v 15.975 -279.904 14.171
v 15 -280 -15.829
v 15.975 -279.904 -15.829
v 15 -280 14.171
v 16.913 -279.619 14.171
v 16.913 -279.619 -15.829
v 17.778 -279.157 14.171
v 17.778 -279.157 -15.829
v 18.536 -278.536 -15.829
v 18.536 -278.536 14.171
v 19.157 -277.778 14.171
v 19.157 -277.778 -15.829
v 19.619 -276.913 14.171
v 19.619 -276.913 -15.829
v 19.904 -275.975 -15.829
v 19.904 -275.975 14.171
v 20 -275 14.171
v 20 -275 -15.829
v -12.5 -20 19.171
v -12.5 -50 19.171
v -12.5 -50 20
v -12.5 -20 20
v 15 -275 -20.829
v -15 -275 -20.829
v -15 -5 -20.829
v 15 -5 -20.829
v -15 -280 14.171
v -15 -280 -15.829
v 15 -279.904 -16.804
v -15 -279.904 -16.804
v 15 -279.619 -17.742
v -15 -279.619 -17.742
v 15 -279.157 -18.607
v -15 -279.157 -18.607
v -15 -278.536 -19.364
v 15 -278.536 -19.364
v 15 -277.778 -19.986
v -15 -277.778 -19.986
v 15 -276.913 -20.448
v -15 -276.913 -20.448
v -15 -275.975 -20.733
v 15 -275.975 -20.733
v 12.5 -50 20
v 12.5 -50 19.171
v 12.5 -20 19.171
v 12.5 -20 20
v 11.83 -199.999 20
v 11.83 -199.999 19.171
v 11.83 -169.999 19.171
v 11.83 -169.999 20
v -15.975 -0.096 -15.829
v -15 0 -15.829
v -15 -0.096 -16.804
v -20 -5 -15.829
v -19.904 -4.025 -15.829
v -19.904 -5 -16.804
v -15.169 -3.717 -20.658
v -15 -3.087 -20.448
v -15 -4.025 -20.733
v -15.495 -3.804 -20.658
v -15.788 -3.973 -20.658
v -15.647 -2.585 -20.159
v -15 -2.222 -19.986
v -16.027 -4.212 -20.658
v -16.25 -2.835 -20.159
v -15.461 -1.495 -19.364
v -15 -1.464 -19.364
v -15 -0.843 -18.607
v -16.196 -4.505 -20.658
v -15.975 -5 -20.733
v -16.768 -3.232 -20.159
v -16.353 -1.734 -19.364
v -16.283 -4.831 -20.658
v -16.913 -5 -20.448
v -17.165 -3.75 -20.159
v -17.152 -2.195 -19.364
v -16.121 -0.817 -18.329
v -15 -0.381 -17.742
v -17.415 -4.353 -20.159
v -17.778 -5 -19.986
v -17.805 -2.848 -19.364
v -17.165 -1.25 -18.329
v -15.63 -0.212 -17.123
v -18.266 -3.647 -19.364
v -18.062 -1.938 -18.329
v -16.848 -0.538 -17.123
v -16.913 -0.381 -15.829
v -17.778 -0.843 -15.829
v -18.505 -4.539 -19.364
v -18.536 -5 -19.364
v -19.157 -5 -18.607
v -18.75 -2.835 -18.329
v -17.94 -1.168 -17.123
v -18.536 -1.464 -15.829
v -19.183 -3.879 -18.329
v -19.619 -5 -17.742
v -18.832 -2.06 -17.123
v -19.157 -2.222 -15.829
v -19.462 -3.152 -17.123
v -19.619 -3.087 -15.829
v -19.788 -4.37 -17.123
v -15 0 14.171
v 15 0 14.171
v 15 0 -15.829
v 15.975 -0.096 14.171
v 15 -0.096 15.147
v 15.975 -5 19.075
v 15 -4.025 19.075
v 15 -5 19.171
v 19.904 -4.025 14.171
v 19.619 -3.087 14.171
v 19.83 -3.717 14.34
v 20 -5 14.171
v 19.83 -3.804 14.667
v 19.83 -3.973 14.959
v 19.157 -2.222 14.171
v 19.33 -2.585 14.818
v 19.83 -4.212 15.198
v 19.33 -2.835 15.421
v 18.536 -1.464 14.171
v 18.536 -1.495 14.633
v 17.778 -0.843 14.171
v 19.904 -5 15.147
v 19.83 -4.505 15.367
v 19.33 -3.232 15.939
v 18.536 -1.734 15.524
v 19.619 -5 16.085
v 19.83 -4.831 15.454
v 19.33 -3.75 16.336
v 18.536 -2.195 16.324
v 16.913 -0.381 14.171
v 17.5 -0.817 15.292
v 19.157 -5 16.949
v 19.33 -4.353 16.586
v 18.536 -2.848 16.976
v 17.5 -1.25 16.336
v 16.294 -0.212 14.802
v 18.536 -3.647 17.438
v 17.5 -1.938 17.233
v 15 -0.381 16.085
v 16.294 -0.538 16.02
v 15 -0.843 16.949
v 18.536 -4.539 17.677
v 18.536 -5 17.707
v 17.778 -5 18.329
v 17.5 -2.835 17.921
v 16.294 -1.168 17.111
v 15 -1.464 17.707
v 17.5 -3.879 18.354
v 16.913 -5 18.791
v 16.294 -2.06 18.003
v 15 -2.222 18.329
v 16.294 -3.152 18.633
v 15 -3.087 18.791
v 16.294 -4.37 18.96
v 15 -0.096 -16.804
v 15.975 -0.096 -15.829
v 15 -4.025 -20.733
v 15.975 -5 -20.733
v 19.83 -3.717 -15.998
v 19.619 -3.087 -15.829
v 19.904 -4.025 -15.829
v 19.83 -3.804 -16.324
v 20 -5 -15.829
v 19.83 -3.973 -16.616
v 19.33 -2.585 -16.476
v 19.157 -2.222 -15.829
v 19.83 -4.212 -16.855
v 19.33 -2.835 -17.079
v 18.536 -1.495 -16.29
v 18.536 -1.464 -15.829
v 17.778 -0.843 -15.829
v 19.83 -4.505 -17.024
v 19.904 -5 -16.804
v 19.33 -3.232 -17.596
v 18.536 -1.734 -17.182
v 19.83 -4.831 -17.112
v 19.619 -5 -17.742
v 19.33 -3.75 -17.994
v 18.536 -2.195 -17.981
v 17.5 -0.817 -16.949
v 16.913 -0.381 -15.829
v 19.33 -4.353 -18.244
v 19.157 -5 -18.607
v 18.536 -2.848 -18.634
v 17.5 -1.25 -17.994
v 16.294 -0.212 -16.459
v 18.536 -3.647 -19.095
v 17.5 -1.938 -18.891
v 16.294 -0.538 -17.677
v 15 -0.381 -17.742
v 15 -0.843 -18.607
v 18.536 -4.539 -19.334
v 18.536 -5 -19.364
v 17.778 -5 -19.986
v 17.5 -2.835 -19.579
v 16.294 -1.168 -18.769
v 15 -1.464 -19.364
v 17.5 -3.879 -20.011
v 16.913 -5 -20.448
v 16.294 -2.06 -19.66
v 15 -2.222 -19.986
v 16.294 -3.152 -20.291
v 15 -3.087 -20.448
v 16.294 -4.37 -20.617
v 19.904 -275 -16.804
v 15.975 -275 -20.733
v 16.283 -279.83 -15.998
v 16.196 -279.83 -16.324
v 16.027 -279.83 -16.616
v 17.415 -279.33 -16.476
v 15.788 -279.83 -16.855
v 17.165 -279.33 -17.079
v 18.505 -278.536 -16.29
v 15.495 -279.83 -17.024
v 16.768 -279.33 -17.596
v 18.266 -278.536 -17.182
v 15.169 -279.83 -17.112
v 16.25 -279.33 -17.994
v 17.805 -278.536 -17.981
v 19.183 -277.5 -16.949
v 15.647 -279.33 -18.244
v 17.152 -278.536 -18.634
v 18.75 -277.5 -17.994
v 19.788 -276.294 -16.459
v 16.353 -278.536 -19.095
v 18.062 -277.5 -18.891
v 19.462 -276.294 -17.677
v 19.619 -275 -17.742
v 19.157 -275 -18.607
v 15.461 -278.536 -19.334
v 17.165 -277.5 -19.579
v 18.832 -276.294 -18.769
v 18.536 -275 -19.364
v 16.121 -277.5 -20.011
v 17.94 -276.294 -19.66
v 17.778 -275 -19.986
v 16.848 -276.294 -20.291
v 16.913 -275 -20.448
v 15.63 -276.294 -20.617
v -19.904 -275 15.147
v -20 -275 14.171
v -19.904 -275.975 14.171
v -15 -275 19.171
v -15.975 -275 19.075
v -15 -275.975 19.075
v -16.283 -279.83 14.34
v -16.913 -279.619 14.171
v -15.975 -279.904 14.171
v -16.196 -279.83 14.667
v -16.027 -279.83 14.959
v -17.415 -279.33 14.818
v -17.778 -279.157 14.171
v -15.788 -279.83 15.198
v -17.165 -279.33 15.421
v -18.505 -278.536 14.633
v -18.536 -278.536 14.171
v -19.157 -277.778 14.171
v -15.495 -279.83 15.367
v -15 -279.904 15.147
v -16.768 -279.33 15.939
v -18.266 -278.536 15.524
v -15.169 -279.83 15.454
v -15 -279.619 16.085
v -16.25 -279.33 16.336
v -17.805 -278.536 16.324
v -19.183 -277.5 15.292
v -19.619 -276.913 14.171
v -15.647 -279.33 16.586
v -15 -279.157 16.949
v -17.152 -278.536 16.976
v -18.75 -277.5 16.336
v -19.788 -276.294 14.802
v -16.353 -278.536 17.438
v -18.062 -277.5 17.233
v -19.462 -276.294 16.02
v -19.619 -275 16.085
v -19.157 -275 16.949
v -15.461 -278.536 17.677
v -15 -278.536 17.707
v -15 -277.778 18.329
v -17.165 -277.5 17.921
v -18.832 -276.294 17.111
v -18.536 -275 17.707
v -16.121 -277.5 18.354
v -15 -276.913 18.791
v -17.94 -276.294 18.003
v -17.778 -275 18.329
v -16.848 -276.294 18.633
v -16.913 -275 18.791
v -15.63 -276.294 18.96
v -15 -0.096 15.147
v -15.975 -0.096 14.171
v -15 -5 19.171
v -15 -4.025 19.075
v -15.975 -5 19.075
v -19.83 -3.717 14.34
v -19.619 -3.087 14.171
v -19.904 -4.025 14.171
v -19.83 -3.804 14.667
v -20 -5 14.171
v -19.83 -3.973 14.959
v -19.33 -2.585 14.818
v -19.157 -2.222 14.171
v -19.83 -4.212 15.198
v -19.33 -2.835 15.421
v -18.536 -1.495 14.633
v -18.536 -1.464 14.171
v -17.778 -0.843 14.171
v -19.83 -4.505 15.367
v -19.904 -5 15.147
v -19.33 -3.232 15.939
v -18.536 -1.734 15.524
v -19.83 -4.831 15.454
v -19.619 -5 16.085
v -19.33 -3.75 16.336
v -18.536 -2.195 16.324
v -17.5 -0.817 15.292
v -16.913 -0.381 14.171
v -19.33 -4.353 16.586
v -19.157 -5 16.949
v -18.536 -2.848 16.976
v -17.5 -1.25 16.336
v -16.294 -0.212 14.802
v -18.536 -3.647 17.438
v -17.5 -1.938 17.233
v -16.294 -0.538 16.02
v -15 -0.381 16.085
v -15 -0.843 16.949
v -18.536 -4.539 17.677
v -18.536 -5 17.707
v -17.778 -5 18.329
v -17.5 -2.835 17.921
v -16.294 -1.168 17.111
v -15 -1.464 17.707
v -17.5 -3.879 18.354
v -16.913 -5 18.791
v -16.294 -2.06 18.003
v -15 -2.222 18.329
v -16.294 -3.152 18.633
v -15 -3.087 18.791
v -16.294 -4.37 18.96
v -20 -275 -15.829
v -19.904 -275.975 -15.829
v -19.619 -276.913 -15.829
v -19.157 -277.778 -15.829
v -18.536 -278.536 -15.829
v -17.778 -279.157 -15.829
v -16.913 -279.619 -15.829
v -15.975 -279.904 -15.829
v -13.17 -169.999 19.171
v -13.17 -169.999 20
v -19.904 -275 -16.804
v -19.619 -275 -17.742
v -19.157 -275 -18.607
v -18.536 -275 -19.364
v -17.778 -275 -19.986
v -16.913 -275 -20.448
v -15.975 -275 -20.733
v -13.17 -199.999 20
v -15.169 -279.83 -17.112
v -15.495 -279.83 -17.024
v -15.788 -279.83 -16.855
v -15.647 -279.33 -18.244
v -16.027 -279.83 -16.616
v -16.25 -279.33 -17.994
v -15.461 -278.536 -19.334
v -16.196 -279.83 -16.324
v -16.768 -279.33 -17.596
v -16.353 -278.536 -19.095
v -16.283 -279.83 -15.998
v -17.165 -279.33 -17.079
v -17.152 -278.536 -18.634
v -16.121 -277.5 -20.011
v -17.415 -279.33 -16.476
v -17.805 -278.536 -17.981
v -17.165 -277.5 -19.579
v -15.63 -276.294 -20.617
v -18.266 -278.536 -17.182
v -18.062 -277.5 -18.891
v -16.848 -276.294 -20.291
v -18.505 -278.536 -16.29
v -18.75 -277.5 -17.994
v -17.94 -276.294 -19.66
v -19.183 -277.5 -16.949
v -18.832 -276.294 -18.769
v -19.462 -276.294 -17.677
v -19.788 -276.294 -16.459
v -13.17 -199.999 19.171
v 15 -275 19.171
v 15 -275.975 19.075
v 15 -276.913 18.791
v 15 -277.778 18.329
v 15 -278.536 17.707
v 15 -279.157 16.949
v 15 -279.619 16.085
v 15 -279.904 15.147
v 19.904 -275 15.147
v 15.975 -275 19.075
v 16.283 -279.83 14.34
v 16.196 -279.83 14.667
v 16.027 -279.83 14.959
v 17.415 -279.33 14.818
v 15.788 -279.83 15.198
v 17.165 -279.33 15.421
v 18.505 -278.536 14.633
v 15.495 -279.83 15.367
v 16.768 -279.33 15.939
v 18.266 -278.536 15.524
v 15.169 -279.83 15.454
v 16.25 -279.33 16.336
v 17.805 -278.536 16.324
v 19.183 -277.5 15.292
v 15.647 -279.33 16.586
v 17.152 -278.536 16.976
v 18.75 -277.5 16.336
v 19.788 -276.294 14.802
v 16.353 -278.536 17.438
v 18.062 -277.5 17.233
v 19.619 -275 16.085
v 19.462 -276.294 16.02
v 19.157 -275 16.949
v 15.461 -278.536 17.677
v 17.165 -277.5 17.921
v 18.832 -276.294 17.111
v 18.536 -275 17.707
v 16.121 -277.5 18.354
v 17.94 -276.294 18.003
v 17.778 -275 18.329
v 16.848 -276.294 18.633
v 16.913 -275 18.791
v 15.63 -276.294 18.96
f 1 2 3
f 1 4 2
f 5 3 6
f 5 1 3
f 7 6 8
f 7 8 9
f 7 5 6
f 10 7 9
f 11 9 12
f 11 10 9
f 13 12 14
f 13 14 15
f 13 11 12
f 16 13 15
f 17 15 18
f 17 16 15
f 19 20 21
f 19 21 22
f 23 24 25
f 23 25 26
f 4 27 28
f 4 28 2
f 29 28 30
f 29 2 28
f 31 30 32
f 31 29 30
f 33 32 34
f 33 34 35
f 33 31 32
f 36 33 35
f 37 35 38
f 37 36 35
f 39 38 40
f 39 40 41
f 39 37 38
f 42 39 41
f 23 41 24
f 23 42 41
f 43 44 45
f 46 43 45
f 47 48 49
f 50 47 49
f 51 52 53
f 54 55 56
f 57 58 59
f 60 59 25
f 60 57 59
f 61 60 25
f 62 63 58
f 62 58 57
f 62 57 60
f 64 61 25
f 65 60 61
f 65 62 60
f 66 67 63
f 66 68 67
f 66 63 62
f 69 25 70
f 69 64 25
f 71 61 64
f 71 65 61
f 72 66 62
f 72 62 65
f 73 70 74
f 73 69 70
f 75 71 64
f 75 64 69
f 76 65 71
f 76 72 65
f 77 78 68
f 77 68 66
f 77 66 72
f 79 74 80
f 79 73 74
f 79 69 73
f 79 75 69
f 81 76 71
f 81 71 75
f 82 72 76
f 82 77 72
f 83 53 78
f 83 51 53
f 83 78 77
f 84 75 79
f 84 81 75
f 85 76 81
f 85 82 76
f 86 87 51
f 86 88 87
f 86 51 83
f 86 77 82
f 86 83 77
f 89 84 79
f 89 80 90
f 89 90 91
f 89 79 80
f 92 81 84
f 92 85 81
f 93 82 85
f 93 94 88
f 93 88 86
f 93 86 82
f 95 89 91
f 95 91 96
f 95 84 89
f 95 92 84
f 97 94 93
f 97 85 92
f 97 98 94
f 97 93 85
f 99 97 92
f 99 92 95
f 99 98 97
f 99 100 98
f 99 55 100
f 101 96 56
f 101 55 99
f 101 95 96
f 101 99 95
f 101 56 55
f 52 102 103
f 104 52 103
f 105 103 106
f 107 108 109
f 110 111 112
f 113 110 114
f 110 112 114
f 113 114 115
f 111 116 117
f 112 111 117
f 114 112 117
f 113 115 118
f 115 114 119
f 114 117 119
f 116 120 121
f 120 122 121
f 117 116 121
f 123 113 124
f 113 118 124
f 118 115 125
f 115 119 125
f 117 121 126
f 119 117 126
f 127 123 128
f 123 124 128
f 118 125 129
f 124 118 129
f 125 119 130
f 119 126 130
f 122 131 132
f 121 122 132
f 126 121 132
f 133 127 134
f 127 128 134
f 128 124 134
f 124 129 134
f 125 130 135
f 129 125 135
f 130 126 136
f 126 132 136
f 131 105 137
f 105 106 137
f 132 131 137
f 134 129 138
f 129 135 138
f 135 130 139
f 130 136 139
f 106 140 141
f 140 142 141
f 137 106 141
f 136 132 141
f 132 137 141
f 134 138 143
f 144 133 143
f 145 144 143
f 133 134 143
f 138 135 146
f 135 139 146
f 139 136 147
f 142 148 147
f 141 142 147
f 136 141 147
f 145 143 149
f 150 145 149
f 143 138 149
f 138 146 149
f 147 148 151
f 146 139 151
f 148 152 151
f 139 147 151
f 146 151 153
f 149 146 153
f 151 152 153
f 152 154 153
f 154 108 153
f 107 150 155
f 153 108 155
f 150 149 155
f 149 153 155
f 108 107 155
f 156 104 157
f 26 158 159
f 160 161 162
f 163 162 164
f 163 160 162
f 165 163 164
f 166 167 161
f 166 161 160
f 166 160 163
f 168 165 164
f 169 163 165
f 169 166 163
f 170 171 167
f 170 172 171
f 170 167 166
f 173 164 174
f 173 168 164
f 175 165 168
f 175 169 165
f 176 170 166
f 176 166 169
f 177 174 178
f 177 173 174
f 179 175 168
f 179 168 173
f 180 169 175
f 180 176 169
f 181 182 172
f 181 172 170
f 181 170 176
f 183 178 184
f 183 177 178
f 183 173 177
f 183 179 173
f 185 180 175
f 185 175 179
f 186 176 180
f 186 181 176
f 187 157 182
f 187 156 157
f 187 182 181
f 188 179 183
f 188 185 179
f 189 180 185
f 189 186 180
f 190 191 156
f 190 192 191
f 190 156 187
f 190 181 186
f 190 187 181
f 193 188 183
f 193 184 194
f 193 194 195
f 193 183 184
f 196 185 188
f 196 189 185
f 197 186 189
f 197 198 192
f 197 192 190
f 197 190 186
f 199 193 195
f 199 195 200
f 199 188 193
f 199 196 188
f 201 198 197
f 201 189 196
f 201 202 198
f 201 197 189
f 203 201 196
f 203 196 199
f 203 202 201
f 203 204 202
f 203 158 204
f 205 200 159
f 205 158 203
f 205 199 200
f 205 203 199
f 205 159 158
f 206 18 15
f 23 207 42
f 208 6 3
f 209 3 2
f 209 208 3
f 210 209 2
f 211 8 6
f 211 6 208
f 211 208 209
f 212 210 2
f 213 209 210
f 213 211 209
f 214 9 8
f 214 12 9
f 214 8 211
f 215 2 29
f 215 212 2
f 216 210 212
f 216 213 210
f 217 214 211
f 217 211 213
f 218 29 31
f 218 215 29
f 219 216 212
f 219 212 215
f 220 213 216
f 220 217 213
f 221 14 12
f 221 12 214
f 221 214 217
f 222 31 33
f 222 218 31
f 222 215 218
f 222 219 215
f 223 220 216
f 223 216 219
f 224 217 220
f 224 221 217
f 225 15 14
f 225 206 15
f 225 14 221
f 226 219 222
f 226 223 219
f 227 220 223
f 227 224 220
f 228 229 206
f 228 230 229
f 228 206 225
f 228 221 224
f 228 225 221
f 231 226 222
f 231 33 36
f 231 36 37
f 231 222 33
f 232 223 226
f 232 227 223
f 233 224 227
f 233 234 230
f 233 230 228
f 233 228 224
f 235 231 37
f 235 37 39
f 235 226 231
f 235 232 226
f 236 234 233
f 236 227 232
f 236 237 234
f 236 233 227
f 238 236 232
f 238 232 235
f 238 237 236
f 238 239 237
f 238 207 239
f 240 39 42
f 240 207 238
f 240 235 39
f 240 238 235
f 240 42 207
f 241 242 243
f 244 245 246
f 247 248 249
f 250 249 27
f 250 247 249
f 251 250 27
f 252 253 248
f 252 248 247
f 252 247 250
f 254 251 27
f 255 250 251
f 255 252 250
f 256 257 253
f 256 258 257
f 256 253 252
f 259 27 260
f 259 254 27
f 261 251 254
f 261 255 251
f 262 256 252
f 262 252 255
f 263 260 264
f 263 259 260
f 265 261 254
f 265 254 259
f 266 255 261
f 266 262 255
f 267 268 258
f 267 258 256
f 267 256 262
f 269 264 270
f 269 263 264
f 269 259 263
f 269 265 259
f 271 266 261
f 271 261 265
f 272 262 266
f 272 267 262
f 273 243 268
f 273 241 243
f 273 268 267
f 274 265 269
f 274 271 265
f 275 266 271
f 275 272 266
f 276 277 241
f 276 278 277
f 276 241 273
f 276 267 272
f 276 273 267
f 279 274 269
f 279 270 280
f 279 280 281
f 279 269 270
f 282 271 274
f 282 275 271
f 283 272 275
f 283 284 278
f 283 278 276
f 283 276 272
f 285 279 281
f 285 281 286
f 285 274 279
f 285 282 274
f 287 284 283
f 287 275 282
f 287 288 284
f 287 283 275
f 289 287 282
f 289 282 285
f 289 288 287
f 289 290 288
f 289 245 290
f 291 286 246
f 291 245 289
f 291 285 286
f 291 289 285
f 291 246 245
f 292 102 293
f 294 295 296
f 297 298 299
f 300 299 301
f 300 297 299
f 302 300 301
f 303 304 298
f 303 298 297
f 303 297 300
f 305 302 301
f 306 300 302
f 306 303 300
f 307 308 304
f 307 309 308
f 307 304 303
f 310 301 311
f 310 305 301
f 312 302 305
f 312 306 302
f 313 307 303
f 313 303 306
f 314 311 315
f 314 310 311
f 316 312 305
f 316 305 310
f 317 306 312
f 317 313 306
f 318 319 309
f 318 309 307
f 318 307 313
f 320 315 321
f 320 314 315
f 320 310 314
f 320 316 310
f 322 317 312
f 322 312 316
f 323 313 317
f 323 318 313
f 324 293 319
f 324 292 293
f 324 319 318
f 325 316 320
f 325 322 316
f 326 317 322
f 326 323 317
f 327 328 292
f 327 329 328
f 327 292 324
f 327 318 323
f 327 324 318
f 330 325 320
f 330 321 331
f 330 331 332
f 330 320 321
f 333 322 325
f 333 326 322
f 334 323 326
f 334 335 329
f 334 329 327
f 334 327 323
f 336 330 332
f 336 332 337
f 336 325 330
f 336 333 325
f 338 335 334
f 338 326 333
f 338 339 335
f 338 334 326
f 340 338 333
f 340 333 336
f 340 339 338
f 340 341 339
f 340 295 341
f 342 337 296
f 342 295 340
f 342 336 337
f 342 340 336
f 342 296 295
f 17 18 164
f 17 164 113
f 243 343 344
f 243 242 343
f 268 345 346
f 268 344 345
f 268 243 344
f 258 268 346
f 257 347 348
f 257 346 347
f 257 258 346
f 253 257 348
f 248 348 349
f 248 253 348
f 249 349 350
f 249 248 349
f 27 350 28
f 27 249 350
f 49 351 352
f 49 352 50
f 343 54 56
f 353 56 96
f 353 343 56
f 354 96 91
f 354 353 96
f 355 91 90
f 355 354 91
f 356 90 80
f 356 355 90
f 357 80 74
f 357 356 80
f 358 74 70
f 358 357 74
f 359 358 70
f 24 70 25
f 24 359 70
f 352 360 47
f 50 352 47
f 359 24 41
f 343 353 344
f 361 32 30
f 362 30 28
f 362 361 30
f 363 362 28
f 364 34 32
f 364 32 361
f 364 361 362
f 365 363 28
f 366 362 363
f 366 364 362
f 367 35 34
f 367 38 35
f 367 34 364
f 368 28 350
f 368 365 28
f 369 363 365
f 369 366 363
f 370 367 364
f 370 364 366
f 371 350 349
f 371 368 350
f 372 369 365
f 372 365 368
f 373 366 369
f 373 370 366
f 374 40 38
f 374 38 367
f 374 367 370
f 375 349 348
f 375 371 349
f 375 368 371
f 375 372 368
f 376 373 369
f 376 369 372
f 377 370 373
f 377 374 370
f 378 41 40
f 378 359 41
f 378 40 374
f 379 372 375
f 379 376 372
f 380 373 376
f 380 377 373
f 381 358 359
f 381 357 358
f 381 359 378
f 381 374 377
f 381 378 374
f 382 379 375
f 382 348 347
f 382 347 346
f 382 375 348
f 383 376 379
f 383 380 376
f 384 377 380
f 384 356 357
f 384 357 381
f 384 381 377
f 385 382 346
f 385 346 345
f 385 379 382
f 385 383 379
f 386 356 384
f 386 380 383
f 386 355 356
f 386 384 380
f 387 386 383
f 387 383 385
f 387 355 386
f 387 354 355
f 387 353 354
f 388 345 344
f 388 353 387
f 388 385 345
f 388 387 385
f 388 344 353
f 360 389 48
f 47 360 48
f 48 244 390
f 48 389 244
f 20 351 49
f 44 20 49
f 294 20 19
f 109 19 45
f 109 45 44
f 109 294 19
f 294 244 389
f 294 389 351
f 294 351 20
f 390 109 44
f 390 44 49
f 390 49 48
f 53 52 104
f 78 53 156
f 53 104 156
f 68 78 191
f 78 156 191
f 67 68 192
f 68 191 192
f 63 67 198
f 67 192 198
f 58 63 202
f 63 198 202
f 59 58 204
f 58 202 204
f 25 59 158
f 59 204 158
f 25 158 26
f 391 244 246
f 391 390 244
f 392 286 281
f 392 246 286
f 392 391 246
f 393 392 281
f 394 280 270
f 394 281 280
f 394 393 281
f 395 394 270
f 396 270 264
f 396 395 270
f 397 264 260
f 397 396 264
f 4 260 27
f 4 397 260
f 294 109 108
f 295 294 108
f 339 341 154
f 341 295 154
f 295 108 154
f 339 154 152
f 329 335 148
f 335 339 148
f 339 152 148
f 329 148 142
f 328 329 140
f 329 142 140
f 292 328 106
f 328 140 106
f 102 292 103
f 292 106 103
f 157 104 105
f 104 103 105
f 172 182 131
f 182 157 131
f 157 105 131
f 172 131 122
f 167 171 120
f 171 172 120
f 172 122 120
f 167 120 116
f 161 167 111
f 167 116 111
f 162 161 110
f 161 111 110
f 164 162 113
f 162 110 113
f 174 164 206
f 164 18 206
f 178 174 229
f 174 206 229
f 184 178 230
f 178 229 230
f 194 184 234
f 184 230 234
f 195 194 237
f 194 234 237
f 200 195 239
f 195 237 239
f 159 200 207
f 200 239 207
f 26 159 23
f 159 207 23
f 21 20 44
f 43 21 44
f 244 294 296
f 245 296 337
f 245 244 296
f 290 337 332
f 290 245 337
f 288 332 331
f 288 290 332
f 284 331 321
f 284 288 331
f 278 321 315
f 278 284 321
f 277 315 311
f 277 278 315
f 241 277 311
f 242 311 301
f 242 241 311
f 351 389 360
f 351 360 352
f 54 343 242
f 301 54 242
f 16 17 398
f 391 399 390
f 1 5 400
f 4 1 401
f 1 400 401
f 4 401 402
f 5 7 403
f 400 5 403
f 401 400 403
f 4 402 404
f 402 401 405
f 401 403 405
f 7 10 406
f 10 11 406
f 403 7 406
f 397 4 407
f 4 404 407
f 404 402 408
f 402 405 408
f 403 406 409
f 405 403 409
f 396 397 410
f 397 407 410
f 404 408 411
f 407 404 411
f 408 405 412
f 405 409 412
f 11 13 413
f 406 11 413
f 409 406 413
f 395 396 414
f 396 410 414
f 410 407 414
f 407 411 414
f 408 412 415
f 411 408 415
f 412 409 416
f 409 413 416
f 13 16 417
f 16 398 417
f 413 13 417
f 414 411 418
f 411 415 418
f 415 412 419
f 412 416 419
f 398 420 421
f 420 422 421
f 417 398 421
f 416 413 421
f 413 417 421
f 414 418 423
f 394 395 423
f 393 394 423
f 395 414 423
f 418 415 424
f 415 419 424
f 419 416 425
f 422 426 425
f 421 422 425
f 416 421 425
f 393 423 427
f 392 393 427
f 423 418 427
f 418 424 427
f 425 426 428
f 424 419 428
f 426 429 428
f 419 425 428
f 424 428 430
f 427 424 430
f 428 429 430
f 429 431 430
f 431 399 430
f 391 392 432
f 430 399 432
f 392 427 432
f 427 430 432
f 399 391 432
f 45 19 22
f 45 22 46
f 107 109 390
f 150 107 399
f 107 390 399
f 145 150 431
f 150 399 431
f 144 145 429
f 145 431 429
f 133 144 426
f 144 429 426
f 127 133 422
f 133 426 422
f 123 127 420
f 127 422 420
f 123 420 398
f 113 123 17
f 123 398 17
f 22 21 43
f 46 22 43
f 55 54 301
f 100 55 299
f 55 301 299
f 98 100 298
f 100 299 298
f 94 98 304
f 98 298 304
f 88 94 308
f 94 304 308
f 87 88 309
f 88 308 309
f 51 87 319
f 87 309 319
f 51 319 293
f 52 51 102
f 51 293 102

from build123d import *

# Parameters (mm, degrees)
F0_W     = 40
F0_H     = 40
F1_DEPTH = 280
F2_W     = 25
F2_H     = 30
F3_DEPTH = 20
F4_R     = 5


with BuildPart() as f1:
    # F0 (on Front) → F1 (new body)
    with BuildSketch(Plane.XZ):
        with Locations((-1e-06, -0.828695)):
            Rectangle(F0_W, F0_H)
    extrude(amount=F1_DEPTH)

    # F2 (on Top) → F3 (join)
    with BuildSketch(Plane.XY):
        with Locations((-1e-06, -35)):
            Rectangle(F2_W, F2_H)
        with Locations((-0.669636, -184.998505)):
            Rectangle(F2_W, F2_H)
    extrude(amount=F3_DEPTH)

    # F4
    f4_edges = [f1.edges().sort_by_distance(p)[0] for p in [
        (-1e-06, 0, 19.171305),
        (-20.000001, 0, -0.828695),
        (-1e-06, 0, -20.828695),
        (19.999999, 0, -0.828695),
        (19.999999, -140, -20.828695),
        (19.999999, -140, 19.171305),
        (19.999999, -280, -0.828695),
        (-20.000001, -140, -20.828695),
        (-1e-06, -280, -20.828695),
        (-20.000001, -140, 19.171305),
        (-20.000001, -280, -0.828695),
        (-1e-06, -280, 19.171305),
    ]]
    fillet(f4_edges, radius=F4_R)


solid = f1.part
